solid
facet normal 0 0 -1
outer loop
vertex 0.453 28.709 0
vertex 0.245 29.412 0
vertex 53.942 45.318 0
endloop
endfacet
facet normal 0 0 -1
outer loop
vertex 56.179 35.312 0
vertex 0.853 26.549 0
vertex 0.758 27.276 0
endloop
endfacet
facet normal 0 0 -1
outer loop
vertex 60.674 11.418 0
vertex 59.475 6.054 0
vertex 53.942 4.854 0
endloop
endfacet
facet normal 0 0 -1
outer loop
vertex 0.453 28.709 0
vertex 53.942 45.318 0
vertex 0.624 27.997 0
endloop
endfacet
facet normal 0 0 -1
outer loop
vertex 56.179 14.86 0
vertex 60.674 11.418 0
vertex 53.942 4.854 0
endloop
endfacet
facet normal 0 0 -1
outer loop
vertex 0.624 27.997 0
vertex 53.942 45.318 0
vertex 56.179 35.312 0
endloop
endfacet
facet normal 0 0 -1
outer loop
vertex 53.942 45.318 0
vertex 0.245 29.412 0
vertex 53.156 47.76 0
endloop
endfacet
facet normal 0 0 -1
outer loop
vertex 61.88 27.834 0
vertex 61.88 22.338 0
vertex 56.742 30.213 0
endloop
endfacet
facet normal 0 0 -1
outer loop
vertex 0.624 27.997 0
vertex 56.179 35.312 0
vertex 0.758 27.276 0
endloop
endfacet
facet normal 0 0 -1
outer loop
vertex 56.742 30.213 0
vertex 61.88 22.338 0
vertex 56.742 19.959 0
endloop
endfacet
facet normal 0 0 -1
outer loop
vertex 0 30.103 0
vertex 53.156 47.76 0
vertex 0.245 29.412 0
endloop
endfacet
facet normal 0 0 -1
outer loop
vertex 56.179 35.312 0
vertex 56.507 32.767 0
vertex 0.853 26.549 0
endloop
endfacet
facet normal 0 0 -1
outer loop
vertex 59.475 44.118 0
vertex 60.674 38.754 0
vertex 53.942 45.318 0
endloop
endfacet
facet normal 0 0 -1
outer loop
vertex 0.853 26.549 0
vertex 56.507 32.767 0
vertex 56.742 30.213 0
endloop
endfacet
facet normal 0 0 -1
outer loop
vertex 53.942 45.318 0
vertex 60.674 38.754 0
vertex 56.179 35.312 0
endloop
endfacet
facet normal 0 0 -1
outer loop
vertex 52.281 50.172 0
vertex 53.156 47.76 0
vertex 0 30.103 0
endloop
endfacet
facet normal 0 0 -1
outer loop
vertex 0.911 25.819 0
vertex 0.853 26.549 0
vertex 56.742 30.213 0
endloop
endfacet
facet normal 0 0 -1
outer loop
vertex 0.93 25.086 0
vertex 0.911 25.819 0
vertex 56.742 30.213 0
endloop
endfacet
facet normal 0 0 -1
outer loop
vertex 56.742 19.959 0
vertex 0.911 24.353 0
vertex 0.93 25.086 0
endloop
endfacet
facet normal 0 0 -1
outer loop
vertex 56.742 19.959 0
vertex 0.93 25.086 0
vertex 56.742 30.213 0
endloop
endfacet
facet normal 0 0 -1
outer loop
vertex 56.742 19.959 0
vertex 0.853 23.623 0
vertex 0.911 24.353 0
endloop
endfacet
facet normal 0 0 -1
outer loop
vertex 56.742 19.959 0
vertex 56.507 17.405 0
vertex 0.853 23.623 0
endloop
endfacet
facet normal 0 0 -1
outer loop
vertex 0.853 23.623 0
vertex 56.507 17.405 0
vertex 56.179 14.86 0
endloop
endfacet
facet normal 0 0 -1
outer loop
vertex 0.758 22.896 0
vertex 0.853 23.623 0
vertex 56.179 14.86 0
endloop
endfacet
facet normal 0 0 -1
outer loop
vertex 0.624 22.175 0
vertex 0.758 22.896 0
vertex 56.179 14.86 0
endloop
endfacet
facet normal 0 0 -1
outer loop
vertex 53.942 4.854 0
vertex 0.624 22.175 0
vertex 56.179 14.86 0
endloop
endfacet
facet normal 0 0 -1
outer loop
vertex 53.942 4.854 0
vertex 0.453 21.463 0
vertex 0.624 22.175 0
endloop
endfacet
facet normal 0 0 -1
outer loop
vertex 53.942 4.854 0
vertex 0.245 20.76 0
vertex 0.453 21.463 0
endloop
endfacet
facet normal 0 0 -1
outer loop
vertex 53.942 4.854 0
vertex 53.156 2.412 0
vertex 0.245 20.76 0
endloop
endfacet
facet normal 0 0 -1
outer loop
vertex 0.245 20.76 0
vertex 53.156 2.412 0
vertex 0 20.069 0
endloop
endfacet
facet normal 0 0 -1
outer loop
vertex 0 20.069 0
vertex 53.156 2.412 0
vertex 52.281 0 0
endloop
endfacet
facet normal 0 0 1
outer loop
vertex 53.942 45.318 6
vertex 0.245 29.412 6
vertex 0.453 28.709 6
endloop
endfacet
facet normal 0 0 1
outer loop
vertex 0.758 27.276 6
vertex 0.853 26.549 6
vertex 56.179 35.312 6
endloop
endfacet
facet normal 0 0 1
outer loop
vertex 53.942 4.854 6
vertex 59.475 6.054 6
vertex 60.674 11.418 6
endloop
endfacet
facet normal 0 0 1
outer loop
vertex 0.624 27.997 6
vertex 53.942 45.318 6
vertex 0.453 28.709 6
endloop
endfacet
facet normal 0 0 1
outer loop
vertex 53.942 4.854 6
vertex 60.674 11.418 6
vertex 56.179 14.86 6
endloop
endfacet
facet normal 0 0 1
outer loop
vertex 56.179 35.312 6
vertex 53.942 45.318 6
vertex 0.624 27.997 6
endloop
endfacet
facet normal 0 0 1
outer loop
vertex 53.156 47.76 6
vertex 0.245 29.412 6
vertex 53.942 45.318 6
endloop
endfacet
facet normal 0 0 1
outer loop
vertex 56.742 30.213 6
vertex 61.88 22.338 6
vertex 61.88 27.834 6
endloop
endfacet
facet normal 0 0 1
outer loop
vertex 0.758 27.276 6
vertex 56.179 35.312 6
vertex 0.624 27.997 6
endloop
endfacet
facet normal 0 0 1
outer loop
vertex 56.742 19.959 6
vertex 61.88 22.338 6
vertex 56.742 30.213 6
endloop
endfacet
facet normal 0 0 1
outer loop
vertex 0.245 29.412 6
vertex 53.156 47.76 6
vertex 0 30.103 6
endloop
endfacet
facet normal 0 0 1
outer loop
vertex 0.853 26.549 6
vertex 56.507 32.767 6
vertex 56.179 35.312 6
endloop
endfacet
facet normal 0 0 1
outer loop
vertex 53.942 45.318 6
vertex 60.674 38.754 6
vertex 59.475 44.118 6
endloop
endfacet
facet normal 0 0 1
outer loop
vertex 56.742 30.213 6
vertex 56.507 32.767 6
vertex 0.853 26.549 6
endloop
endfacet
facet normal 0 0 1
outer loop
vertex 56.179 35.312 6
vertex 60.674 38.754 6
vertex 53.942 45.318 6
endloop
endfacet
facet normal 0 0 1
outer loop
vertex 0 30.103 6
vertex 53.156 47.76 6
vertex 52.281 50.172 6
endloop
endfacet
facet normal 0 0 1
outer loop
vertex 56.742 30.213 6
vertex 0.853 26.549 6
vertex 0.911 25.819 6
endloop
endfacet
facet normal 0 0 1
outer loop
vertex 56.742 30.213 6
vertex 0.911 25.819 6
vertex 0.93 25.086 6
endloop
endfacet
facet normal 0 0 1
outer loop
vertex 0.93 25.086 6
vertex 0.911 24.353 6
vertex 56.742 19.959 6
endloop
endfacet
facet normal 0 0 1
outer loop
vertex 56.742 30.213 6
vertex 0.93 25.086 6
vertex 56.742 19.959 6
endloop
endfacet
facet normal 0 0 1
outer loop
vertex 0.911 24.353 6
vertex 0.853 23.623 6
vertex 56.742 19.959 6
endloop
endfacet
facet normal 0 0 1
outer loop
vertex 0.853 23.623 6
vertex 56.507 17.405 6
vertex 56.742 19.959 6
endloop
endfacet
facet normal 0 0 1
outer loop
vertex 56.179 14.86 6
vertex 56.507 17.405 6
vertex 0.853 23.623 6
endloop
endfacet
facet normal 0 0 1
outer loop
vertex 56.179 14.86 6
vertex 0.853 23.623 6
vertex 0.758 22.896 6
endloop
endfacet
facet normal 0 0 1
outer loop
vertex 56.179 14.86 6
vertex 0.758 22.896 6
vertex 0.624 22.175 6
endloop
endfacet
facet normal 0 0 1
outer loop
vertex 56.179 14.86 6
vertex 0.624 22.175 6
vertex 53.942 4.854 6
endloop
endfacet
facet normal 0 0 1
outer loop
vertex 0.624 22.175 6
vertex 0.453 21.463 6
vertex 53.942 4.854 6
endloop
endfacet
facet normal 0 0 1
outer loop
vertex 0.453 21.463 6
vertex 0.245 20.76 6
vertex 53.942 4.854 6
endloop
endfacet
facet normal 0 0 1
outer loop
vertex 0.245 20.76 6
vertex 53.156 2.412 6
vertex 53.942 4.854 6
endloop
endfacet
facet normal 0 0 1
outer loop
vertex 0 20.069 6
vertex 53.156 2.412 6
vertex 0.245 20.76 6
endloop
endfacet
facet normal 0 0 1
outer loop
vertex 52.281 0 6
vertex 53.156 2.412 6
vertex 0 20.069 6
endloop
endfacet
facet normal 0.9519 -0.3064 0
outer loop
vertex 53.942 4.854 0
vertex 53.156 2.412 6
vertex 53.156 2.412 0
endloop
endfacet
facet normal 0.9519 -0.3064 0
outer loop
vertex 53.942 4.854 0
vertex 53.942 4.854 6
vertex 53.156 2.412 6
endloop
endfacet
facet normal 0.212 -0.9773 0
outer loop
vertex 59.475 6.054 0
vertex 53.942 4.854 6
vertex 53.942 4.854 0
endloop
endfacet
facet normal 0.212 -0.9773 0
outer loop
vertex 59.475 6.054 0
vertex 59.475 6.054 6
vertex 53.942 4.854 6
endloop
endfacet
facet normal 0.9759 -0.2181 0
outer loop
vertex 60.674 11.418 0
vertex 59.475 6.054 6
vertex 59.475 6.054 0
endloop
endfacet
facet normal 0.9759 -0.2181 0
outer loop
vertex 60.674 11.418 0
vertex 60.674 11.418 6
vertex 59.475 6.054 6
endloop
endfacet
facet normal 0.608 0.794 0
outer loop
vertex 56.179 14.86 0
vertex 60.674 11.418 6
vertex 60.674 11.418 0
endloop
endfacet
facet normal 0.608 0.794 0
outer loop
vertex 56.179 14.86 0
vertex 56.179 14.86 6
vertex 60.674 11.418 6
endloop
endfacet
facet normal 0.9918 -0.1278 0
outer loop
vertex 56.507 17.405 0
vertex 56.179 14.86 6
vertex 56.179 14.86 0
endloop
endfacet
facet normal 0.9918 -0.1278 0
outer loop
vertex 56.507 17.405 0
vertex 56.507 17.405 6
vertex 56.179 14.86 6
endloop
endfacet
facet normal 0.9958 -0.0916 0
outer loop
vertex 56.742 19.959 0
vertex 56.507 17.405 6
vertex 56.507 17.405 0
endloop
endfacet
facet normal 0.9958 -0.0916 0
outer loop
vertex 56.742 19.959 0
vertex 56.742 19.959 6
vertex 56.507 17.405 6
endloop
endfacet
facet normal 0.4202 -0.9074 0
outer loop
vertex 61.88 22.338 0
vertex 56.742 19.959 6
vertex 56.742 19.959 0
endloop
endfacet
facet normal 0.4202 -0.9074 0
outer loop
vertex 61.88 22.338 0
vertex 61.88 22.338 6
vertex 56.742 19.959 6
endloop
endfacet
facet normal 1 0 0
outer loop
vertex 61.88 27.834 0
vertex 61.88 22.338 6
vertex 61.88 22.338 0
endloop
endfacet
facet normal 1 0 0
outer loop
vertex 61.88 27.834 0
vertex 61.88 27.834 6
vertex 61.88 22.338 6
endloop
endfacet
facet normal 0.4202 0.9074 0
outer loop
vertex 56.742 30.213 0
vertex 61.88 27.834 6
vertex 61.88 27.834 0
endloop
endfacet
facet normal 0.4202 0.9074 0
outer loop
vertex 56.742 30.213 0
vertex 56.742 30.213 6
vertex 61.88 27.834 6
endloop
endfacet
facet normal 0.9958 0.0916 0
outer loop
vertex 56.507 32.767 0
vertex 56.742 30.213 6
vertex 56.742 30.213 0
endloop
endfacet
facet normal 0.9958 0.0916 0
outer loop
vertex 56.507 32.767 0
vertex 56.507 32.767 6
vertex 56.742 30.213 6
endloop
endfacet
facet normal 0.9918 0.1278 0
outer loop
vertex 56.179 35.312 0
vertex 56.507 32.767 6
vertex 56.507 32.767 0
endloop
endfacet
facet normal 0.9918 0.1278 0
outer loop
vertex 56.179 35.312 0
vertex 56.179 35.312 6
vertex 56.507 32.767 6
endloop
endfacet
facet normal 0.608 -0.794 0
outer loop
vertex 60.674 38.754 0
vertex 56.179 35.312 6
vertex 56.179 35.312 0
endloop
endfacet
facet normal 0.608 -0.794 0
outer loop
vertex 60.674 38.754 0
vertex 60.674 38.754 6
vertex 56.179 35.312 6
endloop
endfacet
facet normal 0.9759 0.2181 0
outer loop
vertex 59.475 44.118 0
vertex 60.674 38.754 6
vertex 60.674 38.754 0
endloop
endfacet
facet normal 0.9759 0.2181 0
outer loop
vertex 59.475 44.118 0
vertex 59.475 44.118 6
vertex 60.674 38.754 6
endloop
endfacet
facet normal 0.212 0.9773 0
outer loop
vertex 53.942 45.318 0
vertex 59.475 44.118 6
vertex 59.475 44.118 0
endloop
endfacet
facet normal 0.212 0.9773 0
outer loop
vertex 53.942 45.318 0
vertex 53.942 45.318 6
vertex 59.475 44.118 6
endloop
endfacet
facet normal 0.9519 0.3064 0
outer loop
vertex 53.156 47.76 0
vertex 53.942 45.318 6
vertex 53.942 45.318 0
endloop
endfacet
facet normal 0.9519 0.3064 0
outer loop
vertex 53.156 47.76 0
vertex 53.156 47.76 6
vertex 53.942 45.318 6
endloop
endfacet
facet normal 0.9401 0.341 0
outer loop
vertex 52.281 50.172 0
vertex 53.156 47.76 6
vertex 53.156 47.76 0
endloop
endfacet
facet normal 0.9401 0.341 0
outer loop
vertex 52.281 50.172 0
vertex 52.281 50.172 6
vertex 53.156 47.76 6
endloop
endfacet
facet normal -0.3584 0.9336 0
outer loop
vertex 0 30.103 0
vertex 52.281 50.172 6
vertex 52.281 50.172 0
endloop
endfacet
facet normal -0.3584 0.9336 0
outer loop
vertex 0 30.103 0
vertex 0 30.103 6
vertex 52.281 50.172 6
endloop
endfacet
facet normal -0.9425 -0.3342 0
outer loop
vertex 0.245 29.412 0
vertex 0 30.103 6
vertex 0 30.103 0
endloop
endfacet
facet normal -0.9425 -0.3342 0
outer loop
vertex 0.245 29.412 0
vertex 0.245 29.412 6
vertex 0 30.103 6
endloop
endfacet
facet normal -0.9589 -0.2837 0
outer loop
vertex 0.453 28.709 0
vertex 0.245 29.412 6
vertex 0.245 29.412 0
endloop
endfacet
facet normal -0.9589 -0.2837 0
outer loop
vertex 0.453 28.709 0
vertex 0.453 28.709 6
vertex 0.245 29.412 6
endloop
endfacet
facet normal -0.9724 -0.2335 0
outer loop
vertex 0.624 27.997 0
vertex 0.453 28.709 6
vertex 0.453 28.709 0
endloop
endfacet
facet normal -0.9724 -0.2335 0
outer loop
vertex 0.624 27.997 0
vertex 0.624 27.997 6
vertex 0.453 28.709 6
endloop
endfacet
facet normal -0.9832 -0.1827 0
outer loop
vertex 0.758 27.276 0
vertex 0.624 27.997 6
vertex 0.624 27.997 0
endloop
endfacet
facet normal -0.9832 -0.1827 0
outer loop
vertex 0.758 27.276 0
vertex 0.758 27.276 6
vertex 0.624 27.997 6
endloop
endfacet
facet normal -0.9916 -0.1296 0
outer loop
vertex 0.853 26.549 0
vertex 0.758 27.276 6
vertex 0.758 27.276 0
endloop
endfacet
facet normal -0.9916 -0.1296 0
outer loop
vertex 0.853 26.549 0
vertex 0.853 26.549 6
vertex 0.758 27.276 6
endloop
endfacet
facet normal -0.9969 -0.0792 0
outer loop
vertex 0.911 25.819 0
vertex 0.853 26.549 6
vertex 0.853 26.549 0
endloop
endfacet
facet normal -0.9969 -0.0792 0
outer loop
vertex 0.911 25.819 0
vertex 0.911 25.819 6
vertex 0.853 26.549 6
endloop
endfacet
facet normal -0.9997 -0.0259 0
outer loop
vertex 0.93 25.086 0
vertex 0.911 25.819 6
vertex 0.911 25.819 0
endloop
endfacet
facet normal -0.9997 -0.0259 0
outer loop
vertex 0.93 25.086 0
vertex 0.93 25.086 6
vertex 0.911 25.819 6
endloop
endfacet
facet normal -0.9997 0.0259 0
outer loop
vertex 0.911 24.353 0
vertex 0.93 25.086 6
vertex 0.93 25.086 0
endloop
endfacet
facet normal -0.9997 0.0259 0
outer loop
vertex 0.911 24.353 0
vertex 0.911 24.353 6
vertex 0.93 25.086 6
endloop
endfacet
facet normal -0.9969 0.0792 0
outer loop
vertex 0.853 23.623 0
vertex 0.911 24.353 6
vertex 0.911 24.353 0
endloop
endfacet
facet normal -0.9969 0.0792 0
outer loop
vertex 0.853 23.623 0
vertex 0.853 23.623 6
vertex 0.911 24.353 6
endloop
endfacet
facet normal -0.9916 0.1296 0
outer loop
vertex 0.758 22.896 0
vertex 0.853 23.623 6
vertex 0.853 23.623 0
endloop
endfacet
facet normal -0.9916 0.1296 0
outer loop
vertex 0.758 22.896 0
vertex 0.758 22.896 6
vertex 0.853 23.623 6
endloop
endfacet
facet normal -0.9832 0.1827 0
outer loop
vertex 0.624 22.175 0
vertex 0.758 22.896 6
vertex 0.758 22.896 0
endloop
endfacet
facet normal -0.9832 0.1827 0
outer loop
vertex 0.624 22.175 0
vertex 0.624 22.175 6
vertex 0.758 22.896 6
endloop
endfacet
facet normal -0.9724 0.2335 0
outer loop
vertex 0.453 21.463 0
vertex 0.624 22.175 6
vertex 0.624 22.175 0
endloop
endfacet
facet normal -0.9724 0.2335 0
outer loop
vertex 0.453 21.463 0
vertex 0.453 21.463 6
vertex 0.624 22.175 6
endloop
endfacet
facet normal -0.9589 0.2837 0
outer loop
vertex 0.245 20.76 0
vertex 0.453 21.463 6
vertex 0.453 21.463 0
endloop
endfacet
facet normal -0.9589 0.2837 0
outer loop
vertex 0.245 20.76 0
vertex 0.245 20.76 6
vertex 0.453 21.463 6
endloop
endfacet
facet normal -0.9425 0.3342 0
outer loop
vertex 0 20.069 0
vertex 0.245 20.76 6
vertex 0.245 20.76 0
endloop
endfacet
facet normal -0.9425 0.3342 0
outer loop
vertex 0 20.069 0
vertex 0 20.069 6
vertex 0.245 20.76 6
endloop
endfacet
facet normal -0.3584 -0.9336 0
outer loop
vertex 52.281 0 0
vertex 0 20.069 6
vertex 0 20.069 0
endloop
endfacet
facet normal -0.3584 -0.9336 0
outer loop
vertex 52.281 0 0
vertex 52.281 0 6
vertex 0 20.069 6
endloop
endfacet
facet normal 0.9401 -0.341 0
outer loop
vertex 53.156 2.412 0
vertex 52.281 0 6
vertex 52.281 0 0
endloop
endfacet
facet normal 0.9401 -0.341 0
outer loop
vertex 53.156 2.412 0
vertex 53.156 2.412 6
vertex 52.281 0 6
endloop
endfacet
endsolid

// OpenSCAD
$fn = 32;

// ----------------------------------------------------------------------
// Gear sector: 3 teeth on 42 degrees
// ----------------------------------------------------------------------

// --- parameters (mm) ---
sector_angle = 42;        // sector angle, degrees
root_r = 70;              // root circle radius
tooth_h = 5;              // tooth height over the root circle
teeth = 3;                // number of teeth on the sector
hub_r = 14;               // hub bore radius
plate_t = 6;              // sector thickness, Z
arc_step = 3;             // sampling step of the root/hub arcs, degrees
fit_tol = 0.1;            // declared fit tolerance (prompt contract)
free_tol = 0.3;           // declared free tolerance (prompt contract)

tip_r = root_r + tooth_h;  // tip circle radius

profile = [[52.281, 0], [53.156, 2.412], [53.942, 4.854], [59.475, 6.054], [60.674, 11.418], [56.179, 14.86], [56.507, 17.405], [56.742, 19.959], [61.88, 22.338], [61.88, 27.834], [56.742, 30.213], [56.507, 32.767], [56.179, 35.312], [60.674, 38.754], [59.475, 44.118], [53.942, 45.318], [53.156, 47.76], [52.281, 50.172], [0, 30.103], [0.245, 29.412], [0.453, 28.709], [0.624, 27.997], [0.758, 27.276], [0.853, 26.549], [0.911, 25.819], [0.93, 25.086], [0.911, 24.353], [0.853, 23.623], [0.758, 22.896], [0.624, 22.175], [0.453, 21.463], [0.245, 20.76], [0, 20.069]];  // primary outline, 33 points, counter clockwise

// --- the one profile operation ---
linear_extrude(height = plate_t) polygon(points = profile);
